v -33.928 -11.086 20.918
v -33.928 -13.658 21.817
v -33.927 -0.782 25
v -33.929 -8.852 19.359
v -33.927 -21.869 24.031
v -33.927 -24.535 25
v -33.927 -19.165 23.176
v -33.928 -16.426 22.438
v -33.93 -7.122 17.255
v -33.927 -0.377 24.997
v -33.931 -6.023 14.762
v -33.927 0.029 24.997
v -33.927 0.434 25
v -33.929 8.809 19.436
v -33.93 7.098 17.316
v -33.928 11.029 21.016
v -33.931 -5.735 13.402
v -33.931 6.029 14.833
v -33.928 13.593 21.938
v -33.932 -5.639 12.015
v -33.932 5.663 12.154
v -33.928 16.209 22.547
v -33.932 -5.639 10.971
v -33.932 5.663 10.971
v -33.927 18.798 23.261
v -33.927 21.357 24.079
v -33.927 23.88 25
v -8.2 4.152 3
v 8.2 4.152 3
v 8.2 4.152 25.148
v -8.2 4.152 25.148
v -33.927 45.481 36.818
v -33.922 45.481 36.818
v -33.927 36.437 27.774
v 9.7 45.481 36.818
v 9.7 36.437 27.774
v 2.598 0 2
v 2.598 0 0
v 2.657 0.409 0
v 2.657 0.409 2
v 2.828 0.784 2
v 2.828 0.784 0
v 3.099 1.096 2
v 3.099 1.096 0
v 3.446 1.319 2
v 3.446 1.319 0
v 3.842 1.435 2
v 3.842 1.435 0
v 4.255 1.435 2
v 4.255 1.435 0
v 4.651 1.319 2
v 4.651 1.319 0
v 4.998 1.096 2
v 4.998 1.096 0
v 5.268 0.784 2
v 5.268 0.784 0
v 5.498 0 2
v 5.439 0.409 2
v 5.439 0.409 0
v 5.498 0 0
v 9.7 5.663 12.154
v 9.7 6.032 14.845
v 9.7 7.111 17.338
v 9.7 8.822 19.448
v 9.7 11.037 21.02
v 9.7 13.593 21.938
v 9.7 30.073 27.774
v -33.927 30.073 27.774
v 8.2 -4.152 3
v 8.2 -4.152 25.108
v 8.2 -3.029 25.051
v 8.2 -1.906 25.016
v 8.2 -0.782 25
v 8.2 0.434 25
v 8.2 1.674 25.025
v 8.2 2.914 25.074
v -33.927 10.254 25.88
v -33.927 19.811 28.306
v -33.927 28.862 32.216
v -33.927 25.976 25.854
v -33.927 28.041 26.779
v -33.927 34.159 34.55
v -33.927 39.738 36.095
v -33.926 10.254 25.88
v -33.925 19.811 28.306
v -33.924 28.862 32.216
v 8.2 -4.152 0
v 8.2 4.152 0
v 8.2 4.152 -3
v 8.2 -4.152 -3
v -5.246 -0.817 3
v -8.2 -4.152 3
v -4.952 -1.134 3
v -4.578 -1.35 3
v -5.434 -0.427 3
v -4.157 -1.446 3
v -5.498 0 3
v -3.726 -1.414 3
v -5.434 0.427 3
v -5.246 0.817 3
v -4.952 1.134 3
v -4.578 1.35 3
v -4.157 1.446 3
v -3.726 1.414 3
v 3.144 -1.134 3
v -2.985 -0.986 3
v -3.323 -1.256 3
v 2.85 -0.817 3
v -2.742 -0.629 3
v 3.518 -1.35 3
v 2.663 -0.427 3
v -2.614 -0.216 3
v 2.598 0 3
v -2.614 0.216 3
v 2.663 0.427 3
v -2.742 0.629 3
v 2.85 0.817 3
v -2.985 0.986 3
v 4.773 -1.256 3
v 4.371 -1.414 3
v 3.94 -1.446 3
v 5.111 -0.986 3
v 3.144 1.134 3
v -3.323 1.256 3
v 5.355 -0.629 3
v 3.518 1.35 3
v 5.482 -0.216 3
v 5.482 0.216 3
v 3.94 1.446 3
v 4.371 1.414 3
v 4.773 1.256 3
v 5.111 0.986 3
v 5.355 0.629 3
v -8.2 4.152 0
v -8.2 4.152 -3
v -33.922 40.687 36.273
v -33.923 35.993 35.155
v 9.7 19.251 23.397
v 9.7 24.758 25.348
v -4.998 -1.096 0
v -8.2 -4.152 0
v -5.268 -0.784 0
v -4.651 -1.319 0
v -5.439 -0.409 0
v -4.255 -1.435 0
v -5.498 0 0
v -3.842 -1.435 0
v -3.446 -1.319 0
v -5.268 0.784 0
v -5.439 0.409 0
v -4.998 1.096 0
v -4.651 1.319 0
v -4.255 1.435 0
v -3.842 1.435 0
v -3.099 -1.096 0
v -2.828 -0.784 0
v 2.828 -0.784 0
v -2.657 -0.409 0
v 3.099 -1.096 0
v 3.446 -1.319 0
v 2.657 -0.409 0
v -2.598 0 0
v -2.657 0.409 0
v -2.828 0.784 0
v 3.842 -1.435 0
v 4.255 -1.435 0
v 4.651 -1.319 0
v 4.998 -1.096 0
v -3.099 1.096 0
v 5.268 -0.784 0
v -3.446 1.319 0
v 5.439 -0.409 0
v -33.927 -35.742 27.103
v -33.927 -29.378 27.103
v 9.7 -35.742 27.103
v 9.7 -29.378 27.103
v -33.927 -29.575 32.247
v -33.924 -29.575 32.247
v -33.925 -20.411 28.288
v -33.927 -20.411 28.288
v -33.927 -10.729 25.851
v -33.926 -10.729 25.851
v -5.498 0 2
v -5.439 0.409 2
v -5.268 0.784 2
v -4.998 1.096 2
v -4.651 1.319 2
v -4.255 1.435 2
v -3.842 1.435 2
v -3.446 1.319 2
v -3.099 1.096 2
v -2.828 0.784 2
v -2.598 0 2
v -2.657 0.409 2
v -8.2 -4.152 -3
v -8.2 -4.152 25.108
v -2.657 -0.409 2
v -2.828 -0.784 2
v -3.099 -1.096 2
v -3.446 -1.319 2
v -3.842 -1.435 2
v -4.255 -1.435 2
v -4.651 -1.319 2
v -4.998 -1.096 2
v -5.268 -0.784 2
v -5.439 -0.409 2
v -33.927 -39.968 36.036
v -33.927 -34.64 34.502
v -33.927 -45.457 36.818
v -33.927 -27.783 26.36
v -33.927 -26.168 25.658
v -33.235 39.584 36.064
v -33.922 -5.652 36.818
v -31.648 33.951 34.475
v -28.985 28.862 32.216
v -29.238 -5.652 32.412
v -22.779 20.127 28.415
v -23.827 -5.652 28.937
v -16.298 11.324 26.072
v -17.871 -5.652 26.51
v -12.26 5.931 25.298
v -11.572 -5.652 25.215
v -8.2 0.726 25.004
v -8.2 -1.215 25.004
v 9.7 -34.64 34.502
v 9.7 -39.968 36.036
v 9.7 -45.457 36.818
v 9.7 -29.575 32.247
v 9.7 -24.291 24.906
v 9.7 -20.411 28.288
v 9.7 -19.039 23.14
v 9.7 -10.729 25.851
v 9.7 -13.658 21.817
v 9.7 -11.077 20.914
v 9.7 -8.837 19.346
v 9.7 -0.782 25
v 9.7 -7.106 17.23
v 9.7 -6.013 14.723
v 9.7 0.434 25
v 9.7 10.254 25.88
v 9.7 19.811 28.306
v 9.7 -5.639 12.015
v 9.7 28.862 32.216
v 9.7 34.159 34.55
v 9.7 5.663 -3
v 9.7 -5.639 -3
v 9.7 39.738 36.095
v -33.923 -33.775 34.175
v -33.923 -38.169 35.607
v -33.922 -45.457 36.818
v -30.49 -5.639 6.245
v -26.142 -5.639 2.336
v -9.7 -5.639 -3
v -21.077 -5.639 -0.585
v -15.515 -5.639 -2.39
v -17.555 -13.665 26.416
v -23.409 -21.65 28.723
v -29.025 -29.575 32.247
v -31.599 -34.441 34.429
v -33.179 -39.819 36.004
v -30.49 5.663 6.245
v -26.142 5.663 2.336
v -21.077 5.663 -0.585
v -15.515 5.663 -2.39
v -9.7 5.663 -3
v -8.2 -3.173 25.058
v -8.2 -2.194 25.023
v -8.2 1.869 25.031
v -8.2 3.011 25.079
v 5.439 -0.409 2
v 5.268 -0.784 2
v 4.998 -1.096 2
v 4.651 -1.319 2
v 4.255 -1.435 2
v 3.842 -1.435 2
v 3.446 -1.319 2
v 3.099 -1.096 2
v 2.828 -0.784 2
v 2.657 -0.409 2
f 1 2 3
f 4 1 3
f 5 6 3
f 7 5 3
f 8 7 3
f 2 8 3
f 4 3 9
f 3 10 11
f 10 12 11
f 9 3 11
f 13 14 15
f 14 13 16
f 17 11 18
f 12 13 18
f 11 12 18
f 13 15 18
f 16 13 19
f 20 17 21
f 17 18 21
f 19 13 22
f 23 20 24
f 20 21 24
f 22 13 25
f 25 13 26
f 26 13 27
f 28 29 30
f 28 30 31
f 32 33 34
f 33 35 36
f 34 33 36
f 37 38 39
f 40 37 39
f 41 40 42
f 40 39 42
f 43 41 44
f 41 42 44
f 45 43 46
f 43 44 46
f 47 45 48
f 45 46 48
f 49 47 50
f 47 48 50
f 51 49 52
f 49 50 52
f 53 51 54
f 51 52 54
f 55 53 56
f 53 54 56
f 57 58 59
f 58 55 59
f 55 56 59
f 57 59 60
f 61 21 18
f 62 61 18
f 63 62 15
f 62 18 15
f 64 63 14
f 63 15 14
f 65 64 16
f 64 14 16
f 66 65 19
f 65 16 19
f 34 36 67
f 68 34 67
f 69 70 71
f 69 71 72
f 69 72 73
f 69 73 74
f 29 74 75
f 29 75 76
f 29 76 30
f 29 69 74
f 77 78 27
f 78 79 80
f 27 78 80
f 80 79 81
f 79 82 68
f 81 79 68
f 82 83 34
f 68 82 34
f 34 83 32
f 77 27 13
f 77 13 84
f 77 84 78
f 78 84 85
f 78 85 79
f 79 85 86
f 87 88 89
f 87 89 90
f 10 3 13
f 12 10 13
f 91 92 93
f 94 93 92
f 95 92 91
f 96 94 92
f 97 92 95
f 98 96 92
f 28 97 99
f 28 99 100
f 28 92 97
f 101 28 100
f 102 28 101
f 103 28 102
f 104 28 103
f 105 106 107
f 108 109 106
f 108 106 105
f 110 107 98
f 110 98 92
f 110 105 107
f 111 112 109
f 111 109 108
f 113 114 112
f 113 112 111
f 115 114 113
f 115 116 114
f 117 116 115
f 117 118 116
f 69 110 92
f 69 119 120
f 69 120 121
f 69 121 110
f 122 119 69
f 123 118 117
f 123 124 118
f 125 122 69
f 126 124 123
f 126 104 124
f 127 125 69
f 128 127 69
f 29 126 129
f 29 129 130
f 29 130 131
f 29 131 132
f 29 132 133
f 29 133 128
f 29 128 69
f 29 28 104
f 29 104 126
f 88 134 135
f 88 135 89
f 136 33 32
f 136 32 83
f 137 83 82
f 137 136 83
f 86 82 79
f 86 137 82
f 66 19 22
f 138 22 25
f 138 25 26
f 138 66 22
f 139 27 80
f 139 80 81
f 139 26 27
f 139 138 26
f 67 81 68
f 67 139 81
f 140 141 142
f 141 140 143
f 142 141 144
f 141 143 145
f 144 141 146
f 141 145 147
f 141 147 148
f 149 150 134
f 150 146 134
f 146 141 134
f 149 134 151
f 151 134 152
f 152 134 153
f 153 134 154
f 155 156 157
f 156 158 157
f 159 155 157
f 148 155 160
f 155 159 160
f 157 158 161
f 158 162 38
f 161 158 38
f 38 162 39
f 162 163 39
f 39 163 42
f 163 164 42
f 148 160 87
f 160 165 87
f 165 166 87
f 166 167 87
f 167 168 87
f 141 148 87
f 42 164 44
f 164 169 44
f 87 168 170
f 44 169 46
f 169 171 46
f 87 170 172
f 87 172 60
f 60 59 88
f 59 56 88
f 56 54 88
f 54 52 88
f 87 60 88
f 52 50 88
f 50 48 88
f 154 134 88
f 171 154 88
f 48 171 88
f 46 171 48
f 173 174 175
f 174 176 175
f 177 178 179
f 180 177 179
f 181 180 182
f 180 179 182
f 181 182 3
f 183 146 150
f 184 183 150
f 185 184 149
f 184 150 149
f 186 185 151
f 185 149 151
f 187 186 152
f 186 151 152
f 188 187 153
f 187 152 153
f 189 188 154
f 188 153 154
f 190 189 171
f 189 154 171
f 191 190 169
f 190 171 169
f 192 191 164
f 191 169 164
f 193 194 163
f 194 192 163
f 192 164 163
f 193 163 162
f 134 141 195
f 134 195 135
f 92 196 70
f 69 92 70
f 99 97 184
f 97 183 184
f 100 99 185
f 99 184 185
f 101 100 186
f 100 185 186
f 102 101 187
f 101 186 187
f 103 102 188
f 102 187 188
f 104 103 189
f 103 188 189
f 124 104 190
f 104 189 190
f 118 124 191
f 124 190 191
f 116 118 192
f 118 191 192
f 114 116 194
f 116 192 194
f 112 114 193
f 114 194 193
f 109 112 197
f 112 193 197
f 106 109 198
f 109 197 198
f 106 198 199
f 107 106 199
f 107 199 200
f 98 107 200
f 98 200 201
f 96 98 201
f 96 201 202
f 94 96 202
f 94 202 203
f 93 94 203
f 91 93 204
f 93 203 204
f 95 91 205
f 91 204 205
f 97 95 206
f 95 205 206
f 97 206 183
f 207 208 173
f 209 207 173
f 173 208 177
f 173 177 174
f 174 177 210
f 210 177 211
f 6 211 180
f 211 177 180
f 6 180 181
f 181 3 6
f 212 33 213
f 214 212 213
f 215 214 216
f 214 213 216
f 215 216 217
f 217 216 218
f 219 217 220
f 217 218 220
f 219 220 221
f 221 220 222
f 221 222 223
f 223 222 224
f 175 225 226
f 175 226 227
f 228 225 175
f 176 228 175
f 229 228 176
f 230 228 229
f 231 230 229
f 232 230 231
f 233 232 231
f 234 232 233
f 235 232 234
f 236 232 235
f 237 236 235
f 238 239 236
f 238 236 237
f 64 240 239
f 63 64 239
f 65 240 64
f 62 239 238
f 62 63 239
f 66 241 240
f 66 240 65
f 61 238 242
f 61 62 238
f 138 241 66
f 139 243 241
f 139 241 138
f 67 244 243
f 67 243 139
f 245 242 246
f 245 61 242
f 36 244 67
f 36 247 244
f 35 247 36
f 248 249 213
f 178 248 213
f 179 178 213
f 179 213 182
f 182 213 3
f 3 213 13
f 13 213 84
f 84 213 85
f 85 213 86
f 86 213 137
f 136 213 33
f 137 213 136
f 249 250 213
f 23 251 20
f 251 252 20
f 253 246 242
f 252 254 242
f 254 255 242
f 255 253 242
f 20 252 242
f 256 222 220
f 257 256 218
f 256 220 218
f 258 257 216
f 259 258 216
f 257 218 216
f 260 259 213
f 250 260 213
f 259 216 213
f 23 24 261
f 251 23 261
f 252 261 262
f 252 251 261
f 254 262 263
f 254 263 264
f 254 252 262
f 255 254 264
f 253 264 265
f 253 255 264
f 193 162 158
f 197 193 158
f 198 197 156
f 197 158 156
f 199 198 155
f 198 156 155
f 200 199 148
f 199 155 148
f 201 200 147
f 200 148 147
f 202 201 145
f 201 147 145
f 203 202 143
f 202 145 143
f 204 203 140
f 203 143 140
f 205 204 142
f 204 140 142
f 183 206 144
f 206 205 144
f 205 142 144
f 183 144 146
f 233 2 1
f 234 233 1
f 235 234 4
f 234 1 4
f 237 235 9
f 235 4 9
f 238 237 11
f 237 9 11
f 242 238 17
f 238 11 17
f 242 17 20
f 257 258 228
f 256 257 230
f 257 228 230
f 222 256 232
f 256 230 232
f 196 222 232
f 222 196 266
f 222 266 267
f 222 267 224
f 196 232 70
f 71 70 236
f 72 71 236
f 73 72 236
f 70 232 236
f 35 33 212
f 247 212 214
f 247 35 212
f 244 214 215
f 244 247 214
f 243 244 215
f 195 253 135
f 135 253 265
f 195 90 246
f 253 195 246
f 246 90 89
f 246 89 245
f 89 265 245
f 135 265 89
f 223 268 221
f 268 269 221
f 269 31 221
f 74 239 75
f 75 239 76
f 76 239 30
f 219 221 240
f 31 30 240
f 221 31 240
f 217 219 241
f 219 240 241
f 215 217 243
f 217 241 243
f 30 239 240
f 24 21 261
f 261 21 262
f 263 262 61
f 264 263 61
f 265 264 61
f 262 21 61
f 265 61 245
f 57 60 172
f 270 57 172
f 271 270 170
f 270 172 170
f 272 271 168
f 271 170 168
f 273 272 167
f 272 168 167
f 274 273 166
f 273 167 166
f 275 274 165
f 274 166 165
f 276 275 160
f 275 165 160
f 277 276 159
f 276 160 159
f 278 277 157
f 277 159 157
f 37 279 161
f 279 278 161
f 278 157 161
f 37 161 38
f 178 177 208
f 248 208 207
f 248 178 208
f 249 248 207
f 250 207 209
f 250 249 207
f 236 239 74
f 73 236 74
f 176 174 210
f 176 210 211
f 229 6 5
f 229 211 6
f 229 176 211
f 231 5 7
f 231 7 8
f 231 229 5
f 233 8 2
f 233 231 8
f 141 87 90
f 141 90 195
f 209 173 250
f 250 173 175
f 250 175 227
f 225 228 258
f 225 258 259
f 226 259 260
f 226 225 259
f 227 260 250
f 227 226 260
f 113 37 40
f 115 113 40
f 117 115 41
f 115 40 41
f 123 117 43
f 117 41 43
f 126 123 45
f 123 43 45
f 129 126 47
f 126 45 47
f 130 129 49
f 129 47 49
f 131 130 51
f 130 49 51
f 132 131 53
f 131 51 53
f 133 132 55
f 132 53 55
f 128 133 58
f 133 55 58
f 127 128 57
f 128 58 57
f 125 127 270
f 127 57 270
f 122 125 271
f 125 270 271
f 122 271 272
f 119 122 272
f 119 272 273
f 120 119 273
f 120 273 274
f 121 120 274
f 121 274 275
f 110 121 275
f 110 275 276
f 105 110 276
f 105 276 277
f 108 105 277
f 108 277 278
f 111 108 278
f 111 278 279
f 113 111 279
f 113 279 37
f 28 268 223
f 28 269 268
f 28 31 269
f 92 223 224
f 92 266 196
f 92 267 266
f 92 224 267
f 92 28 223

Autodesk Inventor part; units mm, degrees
ref_plane "YZ Plane" through (0, 0, 0) normal (1, 0, 0) x (0, 1, 0)
ref_plane "XZ Plane" through (0, 0, 0) normal (0, 1, 0) x (-1, 0, 0)
sketch "Sketch1" plane through (0, 0, 0) normal (0, 0, 1) x (1, 0, 0)
  circle A0 centre (-4.048211, 0) radius 1.45
  circle A1 centre (4.048211, 0) radius 1.45
  line L0 (-8, 3.951789) -> (-8, -3.951789)
  line L1 (-8, -3.951789) -> (8, -3.951789)
  line L2 (8, -3.951789) -> (8, 3.951789)
  line L3 (8, 3.951789) -> (-8, 3.951789)
  line L4 (8.2, 4.151789) -> (8.2, -4.151789)
  line L5 (8.2, -4.151789) -> (-8.2, -4.151789)
  line L6 (-8.2, -4.151789) -> (-8.2, 4.151789)
  line L7 (-8.2, 4.151789) -> (8.2, 4.151789)
  point P0 (0, 0)
  dimension "d0" = 0.2
sketch "Sketch1 outline for Extrusion1" plane through (0, 0, 0) normal (0, 0, 1) x (1, 0, 0)
  line L0 (8.2, 4.151789) -> (-8.2, 4.151789)
  line L1 (8.2, -4.151789) -> (8.2, 4.151789)
  line L2 (-8.2, 4.151789) -> (-8.2, -4.151789)
  line L3 (-8.2, -4.151789) -> (8.2, -4.151789)
  circle A0 centre (4.048211, 0) radius 1.45
  circle A1 centre (-4.048211, 0) radius 1.45
extrude "Extrusion1" add sketch "Sketch1 outline for Extrusion1" along normal blind 2
sketch "Sketch2" plane through (0, 0, 2) normal (0, 0, 1) x (1, 0, 0)
  line L0 (8.2, -4.151789) -> (8.2, 4.151789)
  line L1 (8.2, 4.151789) -> (-8.2, 4.151789)
  line L2 (-8.2, 4.151789) -> (-8.2, -4.151789)
  line L3 (-8.2, -4.151789) -> (8.2, -4.151789)
  line L4 (9.7, 5.651789) -> (9.7, -5.651789)
  line L5 (9.7, -5.651789) -> (-9.7, -5.651789)
  line L6 (-9.7, -5.651789) -> (-9.7, 5.651789)
  line L7 (-9.7, 5.651789) -> (9.7, 5.651789)
  point P0 (0, 0)
  dimension "d3" = 1.5
ref_plane "Work Plane1" through (7.997687, -5.958328, -3) normal (0, 0, 1) x (1, 0, 0)
sketch "Sketch2 outline for Extrusion2" plane through (0, 0, 2) normal (0, 0, 1) x (1, 0, 0)
  line L0 (9.7, 5.651789) -> (-9.7, 5.651789)
  line L1 (9.7, -5.651789) -> (9.7, 5.651789)
  line L2 (-9.7, 5.651789) -> (-9.7, -5.651789)
  line L3 (-9.7, -5.651789) -> (9.7, -5.651789)
  line L4 (8.2, -4.151789) -> (-8.2, -4.151789)
  line L5 (8.2, 4.151789) -> (8.2, -4.151789)
  line L6 (-8.2, 4.151789) -> (8.2, 4.151789)
  line L7 (-8.2, -4.151789) -> (-8.2, 4.151789)
extrude "Extrusion2" add sketch "Sketch2 outline for Extrusion2" against normal up to surface (5 mm away)
sketch "Sketch3" plane through (-9.7, 5.651789, 2) normal (0, 1, 0) x (1, 0, 0)
  line L0 (0, 0) -> (0, 5)
  line L1 (0, 0) -> (0, -23)
  line L2 (0, -23) -> (-19.79899, -3.20101)
  line L3 (0, -23) -> (28, -23) construction
  arc A0 (-33.20486, -51.037646) -> (-33.20486, -51.037646) centre (1.795137, -51.024043) ccw
  arc A1 (-33.20486, -51.037646) -> (-33.20486, -51.037646) centre (1.795137, -51.024043) ccw
  line L4 (0, -23) -> (0, -58)
  line L5 (0, -58) -> (2, -58)
  arc A2 (-26.992777, -30.442444) -> (-24.224883, -27.796432) centre (2, -58) ccw
  line L6 (-24.218855, -43.305973) -> (-24.238811, 8.039757)
  line L7 (19.4, 0) -> (19.4, 5)
  line L8 (19.4, 5) -> (19.4, -23)
  line L9 (2, -23) -> (19.4, -23)
  line L10 (0, 0) -> (19.4, 0)
  arc A3 (-24.221288, -37.047392) -> (28, -23) centre (0, -23) ccw
  arc A4 (0, -46) -> (23, -23) centre (0, -23) ccw
  arc A5 (-26.992777, -30.442444) -> (-24.962512, -35.683572) centre (0, -23) ccw
  arc A6 (2, -23) -> (-24.222154, -34.81814) centre (2, -58) ccw
  arc A7 (-24.962512, -35.683572) -> (22.105735, -29.351101) centre (2, -58) ccw
  arc A8 (0, 5) -> (-24.2322, -8.97144) centre (0, -23) ccw
  arc A9 (19.4, -10.645244) -> (0, 0) centre (0, -23) ccw
  point P0 (9.7, 2)
  point P1 (0, -23)
  point P2 (0, -23)
  point P3 (0, -23.05719)
  dimension "d6" = 23
  dimension "d7" = 135
  dimension "d21" = 35
  dimension "d23" = 2
sketch "Sketch3 outline for Extrusion3" plane through (-9.7, 5.651789, 2) normal (0, 1, 0) x (1, 0, 0)
  line L0 (19.4, 0) -> (0, 0)
  line L1 (0, 0) -> (0, 5)
  arc A0 (0, 5) -> (-24.2322, -8.97144) centre (0, -23) ccw
  line L2 (-24.2322, -8.97144) -> (-24.222154, -34.81814)
  arc A1 (-24.222154, -34.81814) -> (2, -23) centre (2, -58) cw
  line L3 (2, -23) -> (19.4, -23)
  line L4 (19.4, -23) -> (19.4, 0)
extrude "Extrusion3" add sketch "Sketch3 outline for Extrusion3" against normal up to surface (11.303579 mm away)
sketch "Sketch18" plane through (-7.7, 5.651789, 25) normal (0, 1, 0) x (1, 0, 0)
  line L0 (-2, 28) -> (17.4, 28)
  arc A0 (-2, 28) -> (-26.2322, 14.02856) centre (-2, 0) ccw
  line L1 (-26.2322, 14.02856) -> (-26.222154, -11.81814)
  arc A1 (0, 0) -> (-26.222154, -11.81814) centre (0, -35) ccw
  line L2 (0, 0) -> (17.4, 0)
  line L3 (17.4, 0) -> (17.4, 28)
  point P0 (7.7, 25)
sketch "Sketch18 outline for Extrusion15" plane through (-7.7, 5.651789, 25) normal (0, 1, 0) x (1, 0, 0)
  line L0 (-26.2322, 14.02856) -> (-26.222154, -11.81814)
  arc A0 (-2, 28) -> (-26.2322, 14.02856) centre (-2, 0) ccw
  line L1 (17.4, 28) -> (-2, 28)
  line L2 (17.4, 0) -> (17.4, 28)
  line L3 (0, 0) -> (17.4, 0)
  arc A1 (-26.222154, -11.81814) -> (0, 0) centre (0, -35) cw
extrude "Extrusion15" add sketch "Sketch18 outline for Extrusion15" along normal blind 47.75
sketch "Sketch19" plane through (-9.7, -5.651789, -3) normal (0, -1, 0) x (1, 0, 0)
  line L0 (19.4, 0) -> (0, 0)
  line L1 (19.4, 28) -> (19.4, 0)
  line L2 (2, 28) -> (19.4, 28)
  arc A0 (-24.222154, 39.81814) -> (2, 28) centre (2, 63) ccw
  line L3 (-24.2322, 13.97144) -> (-24.222154, 39.81814)
  arc A1 (-24.2322, 13.97144) -> (0, 0) centre (0, 28) ccw
  point P0 (9.7, 3)
sketch "Sketch19 outline for Extrusion16" plane through (-9.7, -5.651789, -3) normal (0, -1, 0) x (1, 0, 0)
  arc A0 (-24.2322, 13.97144) -> (0, 0) centre (0, 28) ccw
  line L0 (-24.222154, 39.81814) -> (-24.2322, 13.97144)
  arc A1 (2, 28) -> (-24.222154, 39.81814) centre (2, 63) cw
  line L1 (19.4, 28) -> (2, 28)
  line L2 (19.4, 0) -> (19.4, 28)
  line L3 (0, 0) -> (19.4, 0)
extrude "Extrusion16" add sketch "Sketch19 outline for Extrusion16" along normal blind 47.75
sketch "Sketch20" plane through (9.7, 53.401789, 25) normal (1, 0, 0) x (0, 0, -1)
  circle A0 centre (-28.024043, -53.730658) radius 35
  line L0 (0, 0) -> (0, -106.803579)
  line L1 (-28.024043, -53.730658) -> (0, -54.184091)
  line L2 (0, -54.184091) -> (6.97302, -54.184091)
  line L3 (0, -54.184091) -> (6.97302, -54.184091) construction
  line L4 (0, -106.803579) -> (0, 0)
  line L5 (-11.81814, 0) -> (0, 0)
  line L6 (-11.81814, -106.803579) -> (-11.81814, 0)
  line L7 (0, -106.803579) -> (-11.81814, -106.803579)
  circle A1 centre (-28.024043, -53.730658) radius 40
  arc A2 (0, -54.184091) -> (-11.81814, -17.160606) centre (-61.997018, -53.575991) ccw
  arc A3 (-11.81814, -90.30071) -> (0, -54.184091) centre (-61.999295, -53.888464) ccw
  point P0 (25, -53.401789)
  point P1 (0, -52.967891)
  dimension "d55" = 0
  dimension "d56" = 6.97302
  dimension "d57" = 5
  dimension "d58" = 62
  dimension "d59" = 62
sketch "Sketch20 outline for Extrusion17" plane through (9.7, 53.401789, 25) normal (1, 0, 0) x (0, 0, -1)
  arc A0 (0, -54.184091) -> (-11.81814, -90.30071) centre (-61.999295, -53.888464) cw
  line L0 (0, -106.803579) -> (0, -54.184091)
  line L1 (-11.81814, -106.803579) -> (0, -106.803579)
  line L2 (-11.81814, -90.30071) -> (-11.81814, -106.803579)
  arc A1 (-11.81814, -17.160606) -> (0, -52.967891) centre (-61.997018, -53.575991) cw
  line L3 (-11.81814, 0) -> (-11.81814, -17.160606)
  line L4 (0, 0) -> (-11.81814, 0)
  line L5 (0, -52.967891) -> (0, 0)
  arc A2 (0, -54.184091) -> (0, -52.967891) centre (-61.997018, -53.575991) ccw
  line L6 (0, -52.967891) -> (0, -54.184091)
extrude "Extrusion17" add sketch "Sketch20 outline for Extrusion17" against normal up to surface (43.626747 mm away)
sketch "Sketch21" plane through (9.7, -53.401789, -3) normal (1, 0, 0) x (0, 0, -1)
  line L0 (-48.305973, 110.199312) -> (3.039757, 58.853579)
  line L1 (3.015448, 47.95) -> (-48.305973, -3.371424)
  line L2 (-49.720186, 108.785098) -> (1.625543, 57.439365)
  line L3 (1.601234, 49.364214) -> (-49.720186, -1.957211)
  line L4 (0, 0) -> (-39.81814, 0)
  line L5 (0, 106.803579) -> (0, 0)
  line L6 (0, 106.803579) -> (-39.81814, 106.803579)
  line L7 (-39.81814, 106.803579) -> (-39.81814, 89.642972)
  arc A0 (-28, 53.835688) -> (-39.81814, 89.642972) centre (-89.997018, 53.227588) ccw
  line L8 (-28, 53.835688) -> (-28, 52.619488)
  arc A1 (-39.81814, 16.502868) -> (-28, 52.619488) centre (-89.999295, 52.915114) ccw
  line L9 (-39.81814, 16.502868) -> (-39.81814, 0)
  point P0 (-3, 53.401789)
  point P1 (0, 47.762979)
  point P2 (-39.81814, 7.944836)
  point P3 (-39.81814, 98.883051)
  point P4 (0, 59.064908)
  dimension "d62" = 2
  dimension "d63" = 2
sketch "Sketch21 outline for Extrusion18" plane through (9.7, -53.401789, -3) normal (1, 0, 0) x (0, 0, -1)
  line L0 (-39.81814, 0) -> (0, 0)
  line L1 (-39.81814, 7.944836) -> (-39.81814, 0)
  line L2 (0, 47.762979) -> (-39.81814, 7.944836)
  line L3 (0, 0) -> (0, 47.762979)
  line L4 (0, 106.803579) -> (-39.81814, 106.803579)
  line L5 (0, 59.064908) -> (0, 106.803579)
  line L6 (-39.81814, 98.883051) -> (0, 59.064908)
  line L7 (-39.81814, 106.803579) -> (-39.81814, 98.883051)
extrude "Extrusion18" cut sketch "Sketch21 outline for Extrusion18" against normal through all
fillet "Fillet2" radius 40 2 edges at (-12.1111, -36.8989, 36.8181) (-12.1111, 36.2412, 36.8181)
sketch "Sketch22" plane through (9.7, -5.63881, -3) normal (1, 0, 0) x (0, 0, -1)
  line L0 (0, -0.312979) -> (0, 11.590599)
  line L1 (-39.81814, -39.818143) -> (0, 0)
  line L2 (0, 11.301929) -> (-39.81814, 51.120072)
  arc A0 (-28, 6.072708) -> (-35.216358, 34.500437) centre (-89.997018, 5.464608) ccw
  arc A1 (-35.246627, -23.936442) -> (-28, 4.856508) centre (-89.999295, 5.152135) ccw
  line L3 (-28, 6.072708) -> (-28, 4.856508)
  arc A2 (-35.246627, -23.936442) -> (-39.81814, -39.818143) centre (0.077675, -42.703266) ccw
  arc A3 (-39.81814, 51.120072) -> (-35.216358, 34.500437) centre (0.126003, 53.233229) ccw
  line L4 (-3.181981, 8.119949) -> (-30.774323, 35.712293)
  arc A4 (-23.5, 6.094391) -> (-30.774323, 35.712293) centre (-89.997018, 5.464608) ccw
  line L5 (-23.5, 6.094391) -> (-23.5, 4.845968)
  arc A5 (-30.103262, -23.739303) -> (-23.5, 4.845968) centre (-89.999295, 5.152135) ccw
  line L6 (-30.103262, -23.739303) -> (-3.181981, 3.18198)
  line L7 (-3, 9.590599) -> (-3, 1.687021)
  line L8 (-6, 9.590599) -> (-6, 1.687021)
  line L9 (0, 11.301929) -> (8.286805, 11.301929) construction
  line L10 (0, 11.301929) -> (-23.784266, 11.301929)
  line L11 (0, 11.301929) -> (23.784266, 11.301929) construction
  line L12 (0, 0) -> (-23.699178, 0)
  line L13 (0, 0) -> (23.699178, 0) construction
  line L14 (-30.103262, -23.739303) -> (-30.103262, -30.103264)
  line L15 (-30.774323, 35.712293) -> (-30.774323, 42.076254)
  point P0 (-3, 5.63881)
  point P1 (-23.699178, 0)
  point P2 (-23.753711, 11.301929)
  dimension "d67" = 4.5
  dimension "d68" = 3
  dimension "d70" = 180
  dimension "d71" = 180
sketch "Sketch22 outline for Extrusion19" plane through (9.7, -5.63881, -3) normal (1, 0, 0) x (0, 0, -1)
  line L0 (0, 0) -> (-23.699178, 0)
  line L1 (-30.103262, -30.103264) -> (0, 0)
  line L2 (-30.103262, -23.739303) -> (-30.103262, -30.103264)
  arc A0 (-23.699178, 0) -> (-30.103262, -23.739303) centre (-89.999295, 5.152135) cw
  line L3 (-23.753711, 11.301929) -> (0, 11.301929)
  arc A1 (-30.774323, 35.712293) -> (-23.753711, 11.301929) centre (-89.997018, 5.464608) cw
  line L4 (-30.774323, 42.076254) -> (-30.774323, 35.712293)
  line L5 (0, 11.301929) -> (-30.774323, 42.076254)
extrude "Extrusion19" cut sketch "Sketch22 outline for Extrusion19" against normal through all
sketch "Sketch23" plane through (-7.7, -0.782301, 25) normal (0, 0, 1) x (1, 0, 0)
  line L0 (17.4, -4.856508) -> (-2, -4.856508)
  line L1 (-2, -4.856508) -> (-2, 6.44542)
  line L2 (-2, 6.44542) -> (17.4, 6.44542)
  line L3 (17.4, 6.44542) -> (17.4, -4.856508)
  line L4 (-0.5, 4.934091) -> (-0.5, -3.369488)
  line L5 (-0.5, -3.369488) -> (15.9, -3.369488)
  line L6 (15.9, -3.369488) -> (15.9, 4.934091)
  line L7 (15.9, 4.934091) -> (-0.5, 4.934091)
  point P0 (7.7, 0.782301)
sketch "Sketch23 outline for Extrusion20" plane through (-7.7, -0.782301, 25) normal (0, 0, 1) x (1, 0, 0)
  line L0 (-0.5, 4.934091) -> (-0.5, -3.369488)
  line L1 (15.9, 4.934091) -> (-0.5, 4.934091)
  line L2 (15.9, -3.369488) -> (15.9, 4.934091)
  line L3 (-0.5, -3.369488) -> (15.9, -3.369488)
extrude "Extrusion20" cut sketch "Sketch23 outline for Extrusion20" against normal blind 22
sketch "Sketch26" plane through (9.7, -0.782301, 25) normal (0, 0, 1) x (1, 0, 0)
  line L0 (0, -4.856508) -> (-19.4, -4.856508)
  line L1 (-19.4, -4.856508) -> (-19.4, 6.44542)
  line L2 (-19.4, 6.44542) -> (0, 6.44542)
  line L3 (0, 6.44542) -> (0, -4.856508)
  line L4 (-17.9, 4.934091) -> (-17.9, -3.369488)
  line L5 (-17.9, -3.369488) -> (-1.5, -3.369488)
  line L6 (-1.5, -3.369488) -> (-1.5, 4.934091)
  line L7 (-1.5, 4.934091) -> (-17.9, 4.934091)
  point P0 (-9.7, 0.782301)
sketch "Sketch26 outline for Extrusion21" plane through (9.7, -0.782301, 25) normal (0, 0, 1) x (1, 0, 0)
  line L0 (-17.9, 4.934091) -> (-17.9, -3.369488)
  line L1 (-1.5, 4.934091) -> (-17.9, 4.934091)
  line L2 (-1.5, -3.369488) -> (-1.5, 4.934091)
  line L3 (-17.9, -3.369488) -> (-1.5, -3.369488)
extrude "Extrusion21" cut sketch "Sketch26 outline for Extrusion21" along normal blind 22
sketch "Sketch27" plane through (9.7, -5.63881, -3) normal (0, 0, -1) x (-1, 0, 0)
  circle A0 centre (5.651789, 5.63881) radius 1.45
  circle A1 centre (13.748211, 5.63881) radius 1.45
  point P0 (9.7, 5.63881)
sketch "Sketch27 outline for Extrusion22" plane through (9.7, -5.63881, -3) normal (0, 0, -1) x (-1, 0, 0)
  circle A0 centre (5.651789, 5.63881) radius 1.45
  circle A1 centre (13.748211, 5.63881) radius 1.45
extrude "Extrusion22" cut sketch "Sketch27 outline for Extrusion22" against normal blind 22
fillet "Fillet3" radius 10 2 edges at (-12.1142, 5.6631, 20.7537) (-12.1142, -5.6388, 20.6992)
properties part number "KickerFoot_3DPrint"
